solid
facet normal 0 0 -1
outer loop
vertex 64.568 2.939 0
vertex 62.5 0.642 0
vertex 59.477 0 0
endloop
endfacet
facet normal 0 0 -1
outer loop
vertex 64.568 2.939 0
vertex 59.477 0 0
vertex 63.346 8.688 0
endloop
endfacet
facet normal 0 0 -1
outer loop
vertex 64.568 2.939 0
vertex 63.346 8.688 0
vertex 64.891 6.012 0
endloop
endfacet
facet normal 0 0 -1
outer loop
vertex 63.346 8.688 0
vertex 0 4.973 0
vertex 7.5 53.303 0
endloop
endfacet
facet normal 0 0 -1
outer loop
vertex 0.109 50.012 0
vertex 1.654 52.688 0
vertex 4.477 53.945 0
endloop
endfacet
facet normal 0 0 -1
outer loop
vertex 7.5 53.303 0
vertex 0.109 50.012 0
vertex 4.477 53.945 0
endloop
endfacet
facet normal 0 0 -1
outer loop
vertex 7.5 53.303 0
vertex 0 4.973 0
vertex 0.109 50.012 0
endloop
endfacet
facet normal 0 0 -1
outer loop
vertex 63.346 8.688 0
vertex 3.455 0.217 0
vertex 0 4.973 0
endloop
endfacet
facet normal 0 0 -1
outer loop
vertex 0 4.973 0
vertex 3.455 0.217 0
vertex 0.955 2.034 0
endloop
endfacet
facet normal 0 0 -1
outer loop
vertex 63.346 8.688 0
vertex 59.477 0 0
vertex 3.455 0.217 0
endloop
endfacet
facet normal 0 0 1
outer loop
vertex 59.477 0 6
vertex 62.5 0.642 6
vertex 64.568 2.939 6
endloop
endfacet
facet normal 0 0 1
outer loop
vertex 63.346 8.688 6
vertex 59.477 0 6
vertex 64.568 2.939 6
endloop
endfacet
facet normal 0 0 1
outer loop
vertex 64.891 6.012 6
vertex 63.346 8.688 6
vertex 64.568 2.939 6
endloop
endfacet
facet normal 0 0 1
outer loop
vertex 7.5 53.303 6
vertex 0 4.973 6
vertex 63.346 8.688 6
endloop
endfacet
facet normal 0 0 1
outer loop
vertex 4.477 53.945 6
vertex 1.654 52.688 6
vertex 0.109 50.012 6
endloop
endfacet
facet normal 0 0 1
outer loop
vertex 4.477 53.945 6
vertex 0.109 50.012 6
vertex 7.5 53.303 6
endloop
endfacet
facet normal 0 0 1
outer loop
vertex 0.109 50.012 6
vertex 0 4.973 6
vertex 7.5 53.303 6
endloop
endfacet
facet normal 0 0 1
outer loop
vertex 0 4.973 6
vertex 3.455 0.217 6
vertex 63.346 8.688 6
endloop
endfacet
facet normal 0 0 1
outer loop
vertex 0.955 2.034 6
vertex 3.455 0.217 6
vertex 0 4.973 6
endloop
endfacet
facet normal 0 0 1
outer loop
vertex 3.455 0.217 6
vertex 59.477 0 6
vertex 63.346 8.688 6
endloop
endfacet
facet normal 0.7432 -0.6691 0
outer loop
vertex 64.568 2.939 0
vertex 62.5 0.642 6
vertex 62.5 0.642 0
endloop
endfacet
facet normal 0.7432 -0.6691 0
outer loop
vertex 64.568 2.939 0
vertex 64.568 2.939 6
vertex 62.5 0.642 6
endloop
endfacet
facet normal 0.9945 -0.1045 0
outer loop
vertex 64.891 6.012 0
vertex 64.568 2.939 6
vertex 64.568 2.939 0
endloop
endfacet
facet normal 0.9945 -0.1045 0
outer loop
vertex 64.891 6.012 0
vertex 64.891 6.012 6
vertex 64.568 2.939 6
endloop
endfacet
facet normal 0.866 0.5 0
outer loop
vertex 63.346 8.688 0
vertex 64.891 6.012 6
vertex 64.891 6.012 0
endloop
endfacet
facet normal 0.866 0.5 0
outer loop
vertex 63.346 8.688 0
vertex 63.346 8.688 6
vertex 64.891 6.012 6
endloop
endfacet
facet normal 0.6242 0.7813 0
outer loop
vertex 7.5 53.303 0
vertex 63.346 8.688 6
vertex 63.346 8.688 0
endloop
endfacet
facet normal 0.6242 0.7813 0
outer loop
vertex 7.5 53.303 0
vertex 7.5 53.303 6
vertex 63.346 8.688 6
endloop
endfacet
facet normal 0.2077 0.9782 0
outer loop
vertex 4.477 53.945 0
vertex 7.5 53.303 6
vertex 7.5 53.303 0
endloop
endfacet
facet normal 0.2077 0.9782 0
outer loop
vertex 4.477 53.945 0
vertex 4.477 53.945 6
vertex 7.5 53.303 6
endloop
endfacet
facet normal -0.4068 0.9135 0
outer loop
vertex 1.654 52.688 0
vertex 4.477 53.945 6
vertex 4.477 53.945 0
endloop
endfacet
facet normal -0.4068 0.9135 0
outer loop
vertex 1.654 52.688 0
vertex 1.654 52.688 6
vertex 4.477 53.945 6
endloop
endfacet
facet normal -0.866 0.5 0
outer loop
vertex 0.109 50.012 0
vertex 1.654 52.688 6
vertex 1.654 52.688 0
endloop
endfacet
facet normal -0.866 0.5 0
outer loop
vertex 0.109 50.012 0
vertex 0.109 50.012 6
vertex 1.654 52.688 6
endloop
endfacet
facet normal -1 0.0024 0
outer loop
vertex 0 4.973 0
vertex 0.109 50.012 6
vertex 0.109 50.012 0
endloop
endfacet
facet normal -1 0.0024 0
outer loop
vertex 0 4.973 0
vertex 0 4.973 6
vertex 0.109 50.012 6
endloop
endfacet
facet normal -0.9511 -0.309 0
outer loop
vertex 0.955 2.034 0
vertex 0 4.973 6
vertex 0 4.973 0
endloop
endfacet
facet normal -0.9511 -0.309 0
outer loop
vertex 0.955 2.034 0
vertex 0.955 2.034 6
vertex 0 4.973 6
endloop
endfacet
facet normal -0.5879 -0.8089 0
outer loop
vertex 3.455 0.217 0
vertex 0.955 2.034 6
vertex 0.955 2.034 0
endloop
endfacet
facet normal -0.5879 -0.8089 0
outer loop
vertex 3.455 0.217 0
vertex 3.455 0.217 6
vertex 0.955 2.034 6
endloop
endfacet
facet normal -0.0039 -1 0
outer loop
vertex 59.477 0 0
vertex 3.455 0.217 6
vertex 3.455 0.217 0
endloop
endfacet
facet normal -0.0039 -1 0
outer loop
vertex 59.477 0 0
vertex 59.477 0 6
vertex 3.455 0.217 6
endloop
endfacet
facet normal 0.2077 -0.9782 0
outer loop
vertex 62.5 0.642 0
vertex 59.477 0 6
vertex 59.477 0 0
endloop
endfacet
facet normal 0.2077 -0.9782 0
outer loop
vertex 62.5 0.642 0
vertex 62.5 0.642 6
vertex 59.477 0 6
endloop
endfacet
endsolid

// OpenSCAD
$fn = 32;

// ----------------------------------------------------------------------
// Lever arm: two bosses 10 and 10 mm, 55 mm between centres
// ----------------------------------------------------------------------

// --- parameters (mm) ---
profile_height = 6;       // extrusion height
profile_points = 12;      // points of the closed outline

profile = [[0, 4.973], [0.955, 2.034], [3.455, 0.217], [59.477, 0], [62.5, 0.642], [64.568, 2.939], [64.891, 6.012], [63.346, 8.688], [7.5, 53.303], [4.477, 53.945], [1.654, 52.688], [0.109, 50.012]];  // single closed polygon, 12 points, counter clockwise

// --- the one profile operation ---
linear_extrude(height = profile_height) polygon(points = profile);
